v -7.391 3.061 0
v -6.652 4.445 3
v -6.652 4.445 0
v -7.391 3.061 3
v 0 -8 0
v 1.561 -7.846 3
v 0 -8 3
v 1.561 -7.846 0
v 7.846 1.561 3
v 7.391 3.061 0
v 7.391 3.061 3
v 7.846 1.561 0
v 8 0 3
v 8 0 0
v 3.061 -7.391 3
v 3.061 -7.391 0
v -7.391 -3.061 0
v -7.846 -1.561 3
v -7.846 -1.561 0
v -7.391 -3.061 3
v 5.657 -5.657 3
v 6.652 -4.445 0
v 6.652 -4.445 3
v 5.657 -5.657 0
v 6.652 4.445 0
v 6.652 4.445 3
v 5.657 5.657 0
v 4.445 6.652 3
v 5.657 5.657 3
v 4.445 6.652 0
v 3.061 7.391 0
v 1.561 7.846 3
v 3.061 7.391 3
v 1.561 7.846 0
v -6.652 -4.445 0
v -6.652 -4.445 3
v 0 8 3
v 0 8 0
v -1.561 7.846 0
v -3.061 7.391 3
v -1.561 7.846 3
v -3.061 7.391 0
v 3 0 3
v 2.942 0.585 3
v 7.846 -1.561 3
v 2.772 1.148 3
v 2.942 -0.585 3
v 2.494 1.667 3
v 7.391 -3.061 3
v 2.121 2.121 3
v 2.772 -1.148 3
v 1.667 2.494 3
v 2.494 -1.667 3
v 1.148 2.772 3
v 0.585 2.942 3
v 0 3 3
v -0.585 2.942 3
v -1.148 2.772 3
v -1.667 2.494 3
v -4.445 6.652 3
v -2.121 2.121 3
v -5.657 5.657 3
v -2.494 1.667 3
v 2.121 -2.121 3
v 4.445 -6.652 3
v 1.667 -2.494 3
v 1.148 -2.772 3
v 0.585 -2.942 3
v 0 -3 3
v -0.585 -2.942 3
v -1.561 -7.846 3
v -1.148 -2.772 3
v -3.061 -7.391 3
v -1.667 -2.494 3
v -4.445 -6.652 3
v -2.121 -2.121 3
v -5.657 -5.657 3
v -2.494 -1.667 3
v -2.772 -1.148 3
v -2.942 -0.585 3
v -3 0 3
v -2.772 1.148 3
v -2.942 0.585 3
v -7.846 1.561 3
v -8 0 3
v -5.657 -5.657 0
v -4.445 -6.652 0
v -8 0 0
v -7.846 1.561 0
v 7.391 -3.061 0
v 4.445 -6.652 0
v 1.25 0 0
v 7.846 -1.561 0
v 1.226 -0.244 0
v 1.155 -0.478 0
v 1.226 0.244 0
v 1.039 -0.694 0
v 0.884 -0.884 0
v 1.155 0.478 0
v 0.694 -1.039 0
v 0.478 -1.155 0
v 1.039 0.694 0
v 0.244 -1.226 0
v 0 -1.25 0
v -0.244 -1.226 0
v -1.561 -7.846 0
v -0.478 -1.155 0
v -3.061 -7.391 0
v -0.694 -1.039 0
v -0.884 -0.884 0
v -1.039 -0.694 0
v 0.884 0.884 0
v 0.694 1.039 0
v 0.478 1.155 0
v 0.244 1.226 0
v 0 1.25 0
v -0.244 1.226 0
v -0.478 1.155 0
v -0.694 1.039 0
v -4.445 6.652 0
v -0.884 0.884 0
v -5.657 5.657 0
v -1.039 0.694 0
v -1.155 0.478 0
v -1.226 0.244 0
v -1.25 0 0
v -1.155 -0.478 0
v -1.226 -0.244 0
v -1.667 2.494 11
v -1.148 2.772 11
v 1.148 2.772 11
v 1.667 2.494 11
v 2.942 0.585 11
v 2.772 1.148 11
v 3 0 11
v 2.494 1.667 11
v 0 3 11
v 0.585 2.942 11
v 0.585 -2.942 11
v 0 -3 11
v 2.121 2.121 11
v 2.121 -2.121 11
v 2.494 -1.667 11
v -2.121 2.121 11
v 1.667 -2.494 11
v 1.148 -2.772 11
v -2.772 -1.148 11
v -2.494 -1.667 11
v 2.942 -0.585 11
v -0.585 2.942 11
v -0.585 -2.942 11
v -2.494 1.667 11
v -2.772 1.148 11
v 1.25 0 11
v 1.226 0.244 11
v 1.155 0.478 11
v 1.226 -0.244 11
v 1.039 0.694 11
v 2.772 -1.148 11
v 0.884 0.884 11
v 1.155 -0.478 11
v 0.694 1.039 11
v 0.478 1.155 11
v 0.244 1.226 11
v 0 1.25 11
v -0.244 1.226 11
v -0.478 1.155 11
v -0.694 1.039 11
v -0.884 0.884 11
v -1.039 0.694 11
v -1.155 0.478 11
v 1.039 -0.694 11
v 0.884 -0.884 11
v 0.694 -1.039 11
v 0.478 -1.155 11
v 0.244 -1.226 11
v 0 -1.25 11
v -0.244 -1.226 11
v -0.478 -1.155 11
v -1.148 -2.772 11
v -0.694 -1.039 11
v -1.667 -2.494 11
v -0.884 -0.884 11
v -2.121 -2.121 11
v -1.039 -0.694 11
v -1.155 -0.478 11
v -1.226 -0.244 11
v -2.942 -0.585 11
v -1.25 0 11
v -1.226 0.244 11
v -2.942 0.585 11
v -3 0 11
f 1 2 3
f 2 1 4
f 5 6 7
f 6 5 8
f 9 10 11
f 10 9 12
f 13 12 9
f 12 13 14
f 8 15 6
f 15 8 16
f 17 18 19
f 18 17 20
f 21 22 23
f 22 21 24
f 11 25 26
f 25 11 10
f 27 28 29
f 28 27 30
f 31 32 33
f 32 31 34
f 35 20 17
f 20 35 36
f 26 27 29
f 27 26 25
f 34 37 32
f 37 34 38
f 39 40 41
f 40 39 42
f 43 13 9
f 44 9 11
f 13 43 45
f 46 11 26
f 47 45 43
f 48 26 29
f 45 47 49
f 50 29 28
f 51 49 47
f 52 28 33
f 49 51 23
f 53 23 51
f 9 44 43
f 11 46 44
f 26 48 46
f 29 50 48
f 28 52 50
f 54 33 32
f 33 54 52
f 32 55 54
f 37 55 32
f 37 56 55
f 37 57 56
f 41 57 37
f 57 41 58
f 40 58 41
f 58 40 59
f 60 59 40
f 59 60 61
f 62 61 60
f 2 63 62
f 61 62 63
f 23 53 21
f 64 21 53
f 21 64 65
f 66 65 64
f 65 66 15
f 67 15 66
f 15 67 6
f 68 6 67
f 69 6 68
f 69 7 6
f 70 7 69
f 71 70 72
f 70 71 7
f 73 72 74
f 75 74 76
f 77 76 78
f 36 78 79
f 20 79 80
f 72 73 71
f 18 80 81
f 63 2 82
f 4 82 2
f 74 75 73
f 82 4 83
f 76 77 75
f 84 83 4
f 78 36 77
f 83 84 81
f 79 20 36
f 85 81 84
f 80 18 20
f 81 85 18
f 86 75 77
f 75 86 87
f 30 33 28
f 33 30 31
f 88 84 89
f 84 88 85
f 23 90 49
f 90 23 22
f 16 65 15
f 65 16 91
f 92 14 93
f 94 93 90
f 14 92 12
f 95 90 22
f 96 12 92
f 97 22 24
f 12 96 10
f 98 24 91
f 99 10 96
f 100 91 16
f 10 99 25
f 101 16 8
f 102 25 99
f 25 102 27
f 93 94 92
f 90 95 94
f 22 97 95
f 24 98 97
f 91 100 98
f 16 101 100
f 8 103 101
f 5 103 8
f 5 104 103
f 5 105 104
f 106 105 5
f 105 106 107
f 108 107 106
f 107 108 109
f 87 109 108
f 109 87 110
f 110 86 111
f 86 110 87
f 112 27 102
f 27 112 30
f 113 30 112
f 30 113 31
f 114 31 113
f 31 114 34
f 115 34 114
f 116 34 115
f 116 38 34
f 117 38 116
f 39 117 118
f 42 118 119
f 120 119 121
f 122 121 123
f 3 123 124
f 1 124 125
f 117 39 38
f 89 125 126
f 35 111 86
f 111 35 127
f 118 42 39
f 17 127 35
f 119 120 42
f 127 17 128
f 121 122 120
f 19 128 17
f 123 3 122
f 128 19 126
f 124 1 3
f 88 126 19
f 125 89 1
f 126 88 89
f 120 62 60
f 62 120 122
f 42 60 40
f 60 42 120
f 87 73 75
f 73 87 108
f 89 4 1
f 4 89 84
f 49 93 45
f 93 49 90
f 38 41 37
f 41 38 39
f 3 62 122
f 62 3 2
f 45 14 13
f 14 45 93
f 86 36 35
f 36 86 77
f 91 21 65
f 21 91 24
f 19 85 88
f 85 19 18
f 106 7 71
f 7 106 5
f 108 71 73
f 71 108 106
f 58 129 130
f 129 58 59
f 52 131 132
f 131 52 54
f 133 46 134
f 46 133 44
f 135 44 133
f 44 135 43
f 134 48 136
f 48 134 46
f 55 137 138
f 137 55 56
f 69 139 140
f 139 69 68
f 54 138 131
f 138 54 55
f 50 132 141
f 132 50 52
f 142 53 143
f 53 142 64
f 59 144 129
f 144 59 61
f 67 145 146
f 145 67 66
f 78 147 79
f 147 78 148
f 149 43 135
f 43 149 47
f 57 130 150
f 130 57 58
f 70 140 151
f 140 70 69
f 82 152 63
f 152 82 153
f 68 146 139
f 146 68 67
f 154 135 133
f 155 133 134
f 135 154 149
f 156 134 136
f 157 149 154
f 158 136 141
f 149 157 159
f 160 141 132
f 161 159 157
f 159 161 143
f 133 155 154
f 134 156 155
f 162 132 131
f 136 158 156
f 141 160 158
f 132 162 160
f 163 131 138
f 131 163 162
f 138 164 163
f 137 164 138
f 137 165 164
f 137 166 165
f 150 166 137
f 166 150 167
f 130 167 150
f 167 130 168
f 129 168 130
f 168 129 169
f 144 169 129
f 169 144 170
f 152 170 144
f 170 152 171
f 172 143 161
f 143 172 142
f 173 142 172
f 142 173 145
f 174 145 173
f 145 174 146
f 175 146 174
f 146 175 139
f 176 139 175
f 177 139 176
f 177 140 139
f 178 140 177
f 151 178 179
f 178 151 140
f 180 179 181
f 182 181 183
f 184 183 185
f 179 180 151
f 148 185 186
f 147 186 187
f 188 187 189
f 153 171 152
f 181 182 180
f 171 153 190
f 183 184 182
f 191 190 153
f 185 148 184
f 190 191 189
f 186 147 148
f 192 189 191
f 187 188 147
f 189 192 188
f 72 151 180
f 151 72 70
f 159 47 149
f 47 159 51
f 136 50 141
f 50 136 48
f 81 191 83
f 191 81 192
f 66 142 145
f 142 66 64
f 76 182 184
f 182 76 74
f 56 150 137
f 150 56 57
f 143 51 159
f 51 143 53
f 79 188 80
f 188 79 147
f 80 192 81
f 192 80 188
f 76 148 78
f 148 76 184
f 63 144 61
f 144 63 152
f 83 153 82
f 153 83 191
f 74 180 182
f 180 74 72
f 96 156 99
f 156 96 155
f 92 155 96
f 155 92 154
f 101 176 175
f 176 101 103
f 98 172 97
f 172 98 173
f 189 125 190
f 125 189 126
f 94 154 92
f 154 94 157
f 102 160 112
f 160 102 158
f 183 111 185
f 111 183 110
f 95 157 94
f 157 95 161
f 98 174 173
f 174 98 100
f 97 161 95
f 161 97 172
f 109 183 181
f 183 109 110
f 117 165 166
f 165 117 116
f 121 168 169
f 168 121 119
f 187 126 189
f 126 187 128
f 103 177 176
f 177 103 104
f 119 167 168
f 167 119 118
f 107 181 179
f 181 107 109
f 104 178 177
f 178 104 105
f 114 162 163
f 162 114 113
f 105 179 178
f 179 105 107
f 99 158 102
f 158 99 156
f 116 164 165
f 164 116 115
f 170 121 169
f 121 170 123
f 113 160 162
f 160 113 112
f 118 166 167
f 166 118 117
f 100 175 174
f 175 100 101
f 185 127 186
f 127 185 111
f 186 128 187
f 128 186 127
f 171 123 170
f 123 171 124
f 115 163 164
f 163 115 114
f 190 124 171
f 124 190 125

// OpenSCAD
$fn = 32;

// ----------------------------------------------------------------------
// Micro post: flanged post, 5-20 mm class
// ----------------------------------------------------------------------

// --- parameters (mm) ---
post_d = 6;               // post diameter
post_h = 8;               // post height above the flange
flange_d = 16;            // flange diameter
flange_t = 3;             // flange thickness
bore_d = 2.5;             // through bore
fit_tol = 0.02;           // tolerance for press fits, mm
free_tol = 0.2;           // tolerance for clearance fits, mm

total_h = post_h + flange_t;  // overall height

difference() {
  union() {
    cylinder(h = flange_t, d = flange_d);
    translate([0, 0, flange_t]) cylinder(h = post_h, d = post_d);
  }
  translate([0, 0, -1]) cylinder(h = total_h + 2, d = bore_d);
}
